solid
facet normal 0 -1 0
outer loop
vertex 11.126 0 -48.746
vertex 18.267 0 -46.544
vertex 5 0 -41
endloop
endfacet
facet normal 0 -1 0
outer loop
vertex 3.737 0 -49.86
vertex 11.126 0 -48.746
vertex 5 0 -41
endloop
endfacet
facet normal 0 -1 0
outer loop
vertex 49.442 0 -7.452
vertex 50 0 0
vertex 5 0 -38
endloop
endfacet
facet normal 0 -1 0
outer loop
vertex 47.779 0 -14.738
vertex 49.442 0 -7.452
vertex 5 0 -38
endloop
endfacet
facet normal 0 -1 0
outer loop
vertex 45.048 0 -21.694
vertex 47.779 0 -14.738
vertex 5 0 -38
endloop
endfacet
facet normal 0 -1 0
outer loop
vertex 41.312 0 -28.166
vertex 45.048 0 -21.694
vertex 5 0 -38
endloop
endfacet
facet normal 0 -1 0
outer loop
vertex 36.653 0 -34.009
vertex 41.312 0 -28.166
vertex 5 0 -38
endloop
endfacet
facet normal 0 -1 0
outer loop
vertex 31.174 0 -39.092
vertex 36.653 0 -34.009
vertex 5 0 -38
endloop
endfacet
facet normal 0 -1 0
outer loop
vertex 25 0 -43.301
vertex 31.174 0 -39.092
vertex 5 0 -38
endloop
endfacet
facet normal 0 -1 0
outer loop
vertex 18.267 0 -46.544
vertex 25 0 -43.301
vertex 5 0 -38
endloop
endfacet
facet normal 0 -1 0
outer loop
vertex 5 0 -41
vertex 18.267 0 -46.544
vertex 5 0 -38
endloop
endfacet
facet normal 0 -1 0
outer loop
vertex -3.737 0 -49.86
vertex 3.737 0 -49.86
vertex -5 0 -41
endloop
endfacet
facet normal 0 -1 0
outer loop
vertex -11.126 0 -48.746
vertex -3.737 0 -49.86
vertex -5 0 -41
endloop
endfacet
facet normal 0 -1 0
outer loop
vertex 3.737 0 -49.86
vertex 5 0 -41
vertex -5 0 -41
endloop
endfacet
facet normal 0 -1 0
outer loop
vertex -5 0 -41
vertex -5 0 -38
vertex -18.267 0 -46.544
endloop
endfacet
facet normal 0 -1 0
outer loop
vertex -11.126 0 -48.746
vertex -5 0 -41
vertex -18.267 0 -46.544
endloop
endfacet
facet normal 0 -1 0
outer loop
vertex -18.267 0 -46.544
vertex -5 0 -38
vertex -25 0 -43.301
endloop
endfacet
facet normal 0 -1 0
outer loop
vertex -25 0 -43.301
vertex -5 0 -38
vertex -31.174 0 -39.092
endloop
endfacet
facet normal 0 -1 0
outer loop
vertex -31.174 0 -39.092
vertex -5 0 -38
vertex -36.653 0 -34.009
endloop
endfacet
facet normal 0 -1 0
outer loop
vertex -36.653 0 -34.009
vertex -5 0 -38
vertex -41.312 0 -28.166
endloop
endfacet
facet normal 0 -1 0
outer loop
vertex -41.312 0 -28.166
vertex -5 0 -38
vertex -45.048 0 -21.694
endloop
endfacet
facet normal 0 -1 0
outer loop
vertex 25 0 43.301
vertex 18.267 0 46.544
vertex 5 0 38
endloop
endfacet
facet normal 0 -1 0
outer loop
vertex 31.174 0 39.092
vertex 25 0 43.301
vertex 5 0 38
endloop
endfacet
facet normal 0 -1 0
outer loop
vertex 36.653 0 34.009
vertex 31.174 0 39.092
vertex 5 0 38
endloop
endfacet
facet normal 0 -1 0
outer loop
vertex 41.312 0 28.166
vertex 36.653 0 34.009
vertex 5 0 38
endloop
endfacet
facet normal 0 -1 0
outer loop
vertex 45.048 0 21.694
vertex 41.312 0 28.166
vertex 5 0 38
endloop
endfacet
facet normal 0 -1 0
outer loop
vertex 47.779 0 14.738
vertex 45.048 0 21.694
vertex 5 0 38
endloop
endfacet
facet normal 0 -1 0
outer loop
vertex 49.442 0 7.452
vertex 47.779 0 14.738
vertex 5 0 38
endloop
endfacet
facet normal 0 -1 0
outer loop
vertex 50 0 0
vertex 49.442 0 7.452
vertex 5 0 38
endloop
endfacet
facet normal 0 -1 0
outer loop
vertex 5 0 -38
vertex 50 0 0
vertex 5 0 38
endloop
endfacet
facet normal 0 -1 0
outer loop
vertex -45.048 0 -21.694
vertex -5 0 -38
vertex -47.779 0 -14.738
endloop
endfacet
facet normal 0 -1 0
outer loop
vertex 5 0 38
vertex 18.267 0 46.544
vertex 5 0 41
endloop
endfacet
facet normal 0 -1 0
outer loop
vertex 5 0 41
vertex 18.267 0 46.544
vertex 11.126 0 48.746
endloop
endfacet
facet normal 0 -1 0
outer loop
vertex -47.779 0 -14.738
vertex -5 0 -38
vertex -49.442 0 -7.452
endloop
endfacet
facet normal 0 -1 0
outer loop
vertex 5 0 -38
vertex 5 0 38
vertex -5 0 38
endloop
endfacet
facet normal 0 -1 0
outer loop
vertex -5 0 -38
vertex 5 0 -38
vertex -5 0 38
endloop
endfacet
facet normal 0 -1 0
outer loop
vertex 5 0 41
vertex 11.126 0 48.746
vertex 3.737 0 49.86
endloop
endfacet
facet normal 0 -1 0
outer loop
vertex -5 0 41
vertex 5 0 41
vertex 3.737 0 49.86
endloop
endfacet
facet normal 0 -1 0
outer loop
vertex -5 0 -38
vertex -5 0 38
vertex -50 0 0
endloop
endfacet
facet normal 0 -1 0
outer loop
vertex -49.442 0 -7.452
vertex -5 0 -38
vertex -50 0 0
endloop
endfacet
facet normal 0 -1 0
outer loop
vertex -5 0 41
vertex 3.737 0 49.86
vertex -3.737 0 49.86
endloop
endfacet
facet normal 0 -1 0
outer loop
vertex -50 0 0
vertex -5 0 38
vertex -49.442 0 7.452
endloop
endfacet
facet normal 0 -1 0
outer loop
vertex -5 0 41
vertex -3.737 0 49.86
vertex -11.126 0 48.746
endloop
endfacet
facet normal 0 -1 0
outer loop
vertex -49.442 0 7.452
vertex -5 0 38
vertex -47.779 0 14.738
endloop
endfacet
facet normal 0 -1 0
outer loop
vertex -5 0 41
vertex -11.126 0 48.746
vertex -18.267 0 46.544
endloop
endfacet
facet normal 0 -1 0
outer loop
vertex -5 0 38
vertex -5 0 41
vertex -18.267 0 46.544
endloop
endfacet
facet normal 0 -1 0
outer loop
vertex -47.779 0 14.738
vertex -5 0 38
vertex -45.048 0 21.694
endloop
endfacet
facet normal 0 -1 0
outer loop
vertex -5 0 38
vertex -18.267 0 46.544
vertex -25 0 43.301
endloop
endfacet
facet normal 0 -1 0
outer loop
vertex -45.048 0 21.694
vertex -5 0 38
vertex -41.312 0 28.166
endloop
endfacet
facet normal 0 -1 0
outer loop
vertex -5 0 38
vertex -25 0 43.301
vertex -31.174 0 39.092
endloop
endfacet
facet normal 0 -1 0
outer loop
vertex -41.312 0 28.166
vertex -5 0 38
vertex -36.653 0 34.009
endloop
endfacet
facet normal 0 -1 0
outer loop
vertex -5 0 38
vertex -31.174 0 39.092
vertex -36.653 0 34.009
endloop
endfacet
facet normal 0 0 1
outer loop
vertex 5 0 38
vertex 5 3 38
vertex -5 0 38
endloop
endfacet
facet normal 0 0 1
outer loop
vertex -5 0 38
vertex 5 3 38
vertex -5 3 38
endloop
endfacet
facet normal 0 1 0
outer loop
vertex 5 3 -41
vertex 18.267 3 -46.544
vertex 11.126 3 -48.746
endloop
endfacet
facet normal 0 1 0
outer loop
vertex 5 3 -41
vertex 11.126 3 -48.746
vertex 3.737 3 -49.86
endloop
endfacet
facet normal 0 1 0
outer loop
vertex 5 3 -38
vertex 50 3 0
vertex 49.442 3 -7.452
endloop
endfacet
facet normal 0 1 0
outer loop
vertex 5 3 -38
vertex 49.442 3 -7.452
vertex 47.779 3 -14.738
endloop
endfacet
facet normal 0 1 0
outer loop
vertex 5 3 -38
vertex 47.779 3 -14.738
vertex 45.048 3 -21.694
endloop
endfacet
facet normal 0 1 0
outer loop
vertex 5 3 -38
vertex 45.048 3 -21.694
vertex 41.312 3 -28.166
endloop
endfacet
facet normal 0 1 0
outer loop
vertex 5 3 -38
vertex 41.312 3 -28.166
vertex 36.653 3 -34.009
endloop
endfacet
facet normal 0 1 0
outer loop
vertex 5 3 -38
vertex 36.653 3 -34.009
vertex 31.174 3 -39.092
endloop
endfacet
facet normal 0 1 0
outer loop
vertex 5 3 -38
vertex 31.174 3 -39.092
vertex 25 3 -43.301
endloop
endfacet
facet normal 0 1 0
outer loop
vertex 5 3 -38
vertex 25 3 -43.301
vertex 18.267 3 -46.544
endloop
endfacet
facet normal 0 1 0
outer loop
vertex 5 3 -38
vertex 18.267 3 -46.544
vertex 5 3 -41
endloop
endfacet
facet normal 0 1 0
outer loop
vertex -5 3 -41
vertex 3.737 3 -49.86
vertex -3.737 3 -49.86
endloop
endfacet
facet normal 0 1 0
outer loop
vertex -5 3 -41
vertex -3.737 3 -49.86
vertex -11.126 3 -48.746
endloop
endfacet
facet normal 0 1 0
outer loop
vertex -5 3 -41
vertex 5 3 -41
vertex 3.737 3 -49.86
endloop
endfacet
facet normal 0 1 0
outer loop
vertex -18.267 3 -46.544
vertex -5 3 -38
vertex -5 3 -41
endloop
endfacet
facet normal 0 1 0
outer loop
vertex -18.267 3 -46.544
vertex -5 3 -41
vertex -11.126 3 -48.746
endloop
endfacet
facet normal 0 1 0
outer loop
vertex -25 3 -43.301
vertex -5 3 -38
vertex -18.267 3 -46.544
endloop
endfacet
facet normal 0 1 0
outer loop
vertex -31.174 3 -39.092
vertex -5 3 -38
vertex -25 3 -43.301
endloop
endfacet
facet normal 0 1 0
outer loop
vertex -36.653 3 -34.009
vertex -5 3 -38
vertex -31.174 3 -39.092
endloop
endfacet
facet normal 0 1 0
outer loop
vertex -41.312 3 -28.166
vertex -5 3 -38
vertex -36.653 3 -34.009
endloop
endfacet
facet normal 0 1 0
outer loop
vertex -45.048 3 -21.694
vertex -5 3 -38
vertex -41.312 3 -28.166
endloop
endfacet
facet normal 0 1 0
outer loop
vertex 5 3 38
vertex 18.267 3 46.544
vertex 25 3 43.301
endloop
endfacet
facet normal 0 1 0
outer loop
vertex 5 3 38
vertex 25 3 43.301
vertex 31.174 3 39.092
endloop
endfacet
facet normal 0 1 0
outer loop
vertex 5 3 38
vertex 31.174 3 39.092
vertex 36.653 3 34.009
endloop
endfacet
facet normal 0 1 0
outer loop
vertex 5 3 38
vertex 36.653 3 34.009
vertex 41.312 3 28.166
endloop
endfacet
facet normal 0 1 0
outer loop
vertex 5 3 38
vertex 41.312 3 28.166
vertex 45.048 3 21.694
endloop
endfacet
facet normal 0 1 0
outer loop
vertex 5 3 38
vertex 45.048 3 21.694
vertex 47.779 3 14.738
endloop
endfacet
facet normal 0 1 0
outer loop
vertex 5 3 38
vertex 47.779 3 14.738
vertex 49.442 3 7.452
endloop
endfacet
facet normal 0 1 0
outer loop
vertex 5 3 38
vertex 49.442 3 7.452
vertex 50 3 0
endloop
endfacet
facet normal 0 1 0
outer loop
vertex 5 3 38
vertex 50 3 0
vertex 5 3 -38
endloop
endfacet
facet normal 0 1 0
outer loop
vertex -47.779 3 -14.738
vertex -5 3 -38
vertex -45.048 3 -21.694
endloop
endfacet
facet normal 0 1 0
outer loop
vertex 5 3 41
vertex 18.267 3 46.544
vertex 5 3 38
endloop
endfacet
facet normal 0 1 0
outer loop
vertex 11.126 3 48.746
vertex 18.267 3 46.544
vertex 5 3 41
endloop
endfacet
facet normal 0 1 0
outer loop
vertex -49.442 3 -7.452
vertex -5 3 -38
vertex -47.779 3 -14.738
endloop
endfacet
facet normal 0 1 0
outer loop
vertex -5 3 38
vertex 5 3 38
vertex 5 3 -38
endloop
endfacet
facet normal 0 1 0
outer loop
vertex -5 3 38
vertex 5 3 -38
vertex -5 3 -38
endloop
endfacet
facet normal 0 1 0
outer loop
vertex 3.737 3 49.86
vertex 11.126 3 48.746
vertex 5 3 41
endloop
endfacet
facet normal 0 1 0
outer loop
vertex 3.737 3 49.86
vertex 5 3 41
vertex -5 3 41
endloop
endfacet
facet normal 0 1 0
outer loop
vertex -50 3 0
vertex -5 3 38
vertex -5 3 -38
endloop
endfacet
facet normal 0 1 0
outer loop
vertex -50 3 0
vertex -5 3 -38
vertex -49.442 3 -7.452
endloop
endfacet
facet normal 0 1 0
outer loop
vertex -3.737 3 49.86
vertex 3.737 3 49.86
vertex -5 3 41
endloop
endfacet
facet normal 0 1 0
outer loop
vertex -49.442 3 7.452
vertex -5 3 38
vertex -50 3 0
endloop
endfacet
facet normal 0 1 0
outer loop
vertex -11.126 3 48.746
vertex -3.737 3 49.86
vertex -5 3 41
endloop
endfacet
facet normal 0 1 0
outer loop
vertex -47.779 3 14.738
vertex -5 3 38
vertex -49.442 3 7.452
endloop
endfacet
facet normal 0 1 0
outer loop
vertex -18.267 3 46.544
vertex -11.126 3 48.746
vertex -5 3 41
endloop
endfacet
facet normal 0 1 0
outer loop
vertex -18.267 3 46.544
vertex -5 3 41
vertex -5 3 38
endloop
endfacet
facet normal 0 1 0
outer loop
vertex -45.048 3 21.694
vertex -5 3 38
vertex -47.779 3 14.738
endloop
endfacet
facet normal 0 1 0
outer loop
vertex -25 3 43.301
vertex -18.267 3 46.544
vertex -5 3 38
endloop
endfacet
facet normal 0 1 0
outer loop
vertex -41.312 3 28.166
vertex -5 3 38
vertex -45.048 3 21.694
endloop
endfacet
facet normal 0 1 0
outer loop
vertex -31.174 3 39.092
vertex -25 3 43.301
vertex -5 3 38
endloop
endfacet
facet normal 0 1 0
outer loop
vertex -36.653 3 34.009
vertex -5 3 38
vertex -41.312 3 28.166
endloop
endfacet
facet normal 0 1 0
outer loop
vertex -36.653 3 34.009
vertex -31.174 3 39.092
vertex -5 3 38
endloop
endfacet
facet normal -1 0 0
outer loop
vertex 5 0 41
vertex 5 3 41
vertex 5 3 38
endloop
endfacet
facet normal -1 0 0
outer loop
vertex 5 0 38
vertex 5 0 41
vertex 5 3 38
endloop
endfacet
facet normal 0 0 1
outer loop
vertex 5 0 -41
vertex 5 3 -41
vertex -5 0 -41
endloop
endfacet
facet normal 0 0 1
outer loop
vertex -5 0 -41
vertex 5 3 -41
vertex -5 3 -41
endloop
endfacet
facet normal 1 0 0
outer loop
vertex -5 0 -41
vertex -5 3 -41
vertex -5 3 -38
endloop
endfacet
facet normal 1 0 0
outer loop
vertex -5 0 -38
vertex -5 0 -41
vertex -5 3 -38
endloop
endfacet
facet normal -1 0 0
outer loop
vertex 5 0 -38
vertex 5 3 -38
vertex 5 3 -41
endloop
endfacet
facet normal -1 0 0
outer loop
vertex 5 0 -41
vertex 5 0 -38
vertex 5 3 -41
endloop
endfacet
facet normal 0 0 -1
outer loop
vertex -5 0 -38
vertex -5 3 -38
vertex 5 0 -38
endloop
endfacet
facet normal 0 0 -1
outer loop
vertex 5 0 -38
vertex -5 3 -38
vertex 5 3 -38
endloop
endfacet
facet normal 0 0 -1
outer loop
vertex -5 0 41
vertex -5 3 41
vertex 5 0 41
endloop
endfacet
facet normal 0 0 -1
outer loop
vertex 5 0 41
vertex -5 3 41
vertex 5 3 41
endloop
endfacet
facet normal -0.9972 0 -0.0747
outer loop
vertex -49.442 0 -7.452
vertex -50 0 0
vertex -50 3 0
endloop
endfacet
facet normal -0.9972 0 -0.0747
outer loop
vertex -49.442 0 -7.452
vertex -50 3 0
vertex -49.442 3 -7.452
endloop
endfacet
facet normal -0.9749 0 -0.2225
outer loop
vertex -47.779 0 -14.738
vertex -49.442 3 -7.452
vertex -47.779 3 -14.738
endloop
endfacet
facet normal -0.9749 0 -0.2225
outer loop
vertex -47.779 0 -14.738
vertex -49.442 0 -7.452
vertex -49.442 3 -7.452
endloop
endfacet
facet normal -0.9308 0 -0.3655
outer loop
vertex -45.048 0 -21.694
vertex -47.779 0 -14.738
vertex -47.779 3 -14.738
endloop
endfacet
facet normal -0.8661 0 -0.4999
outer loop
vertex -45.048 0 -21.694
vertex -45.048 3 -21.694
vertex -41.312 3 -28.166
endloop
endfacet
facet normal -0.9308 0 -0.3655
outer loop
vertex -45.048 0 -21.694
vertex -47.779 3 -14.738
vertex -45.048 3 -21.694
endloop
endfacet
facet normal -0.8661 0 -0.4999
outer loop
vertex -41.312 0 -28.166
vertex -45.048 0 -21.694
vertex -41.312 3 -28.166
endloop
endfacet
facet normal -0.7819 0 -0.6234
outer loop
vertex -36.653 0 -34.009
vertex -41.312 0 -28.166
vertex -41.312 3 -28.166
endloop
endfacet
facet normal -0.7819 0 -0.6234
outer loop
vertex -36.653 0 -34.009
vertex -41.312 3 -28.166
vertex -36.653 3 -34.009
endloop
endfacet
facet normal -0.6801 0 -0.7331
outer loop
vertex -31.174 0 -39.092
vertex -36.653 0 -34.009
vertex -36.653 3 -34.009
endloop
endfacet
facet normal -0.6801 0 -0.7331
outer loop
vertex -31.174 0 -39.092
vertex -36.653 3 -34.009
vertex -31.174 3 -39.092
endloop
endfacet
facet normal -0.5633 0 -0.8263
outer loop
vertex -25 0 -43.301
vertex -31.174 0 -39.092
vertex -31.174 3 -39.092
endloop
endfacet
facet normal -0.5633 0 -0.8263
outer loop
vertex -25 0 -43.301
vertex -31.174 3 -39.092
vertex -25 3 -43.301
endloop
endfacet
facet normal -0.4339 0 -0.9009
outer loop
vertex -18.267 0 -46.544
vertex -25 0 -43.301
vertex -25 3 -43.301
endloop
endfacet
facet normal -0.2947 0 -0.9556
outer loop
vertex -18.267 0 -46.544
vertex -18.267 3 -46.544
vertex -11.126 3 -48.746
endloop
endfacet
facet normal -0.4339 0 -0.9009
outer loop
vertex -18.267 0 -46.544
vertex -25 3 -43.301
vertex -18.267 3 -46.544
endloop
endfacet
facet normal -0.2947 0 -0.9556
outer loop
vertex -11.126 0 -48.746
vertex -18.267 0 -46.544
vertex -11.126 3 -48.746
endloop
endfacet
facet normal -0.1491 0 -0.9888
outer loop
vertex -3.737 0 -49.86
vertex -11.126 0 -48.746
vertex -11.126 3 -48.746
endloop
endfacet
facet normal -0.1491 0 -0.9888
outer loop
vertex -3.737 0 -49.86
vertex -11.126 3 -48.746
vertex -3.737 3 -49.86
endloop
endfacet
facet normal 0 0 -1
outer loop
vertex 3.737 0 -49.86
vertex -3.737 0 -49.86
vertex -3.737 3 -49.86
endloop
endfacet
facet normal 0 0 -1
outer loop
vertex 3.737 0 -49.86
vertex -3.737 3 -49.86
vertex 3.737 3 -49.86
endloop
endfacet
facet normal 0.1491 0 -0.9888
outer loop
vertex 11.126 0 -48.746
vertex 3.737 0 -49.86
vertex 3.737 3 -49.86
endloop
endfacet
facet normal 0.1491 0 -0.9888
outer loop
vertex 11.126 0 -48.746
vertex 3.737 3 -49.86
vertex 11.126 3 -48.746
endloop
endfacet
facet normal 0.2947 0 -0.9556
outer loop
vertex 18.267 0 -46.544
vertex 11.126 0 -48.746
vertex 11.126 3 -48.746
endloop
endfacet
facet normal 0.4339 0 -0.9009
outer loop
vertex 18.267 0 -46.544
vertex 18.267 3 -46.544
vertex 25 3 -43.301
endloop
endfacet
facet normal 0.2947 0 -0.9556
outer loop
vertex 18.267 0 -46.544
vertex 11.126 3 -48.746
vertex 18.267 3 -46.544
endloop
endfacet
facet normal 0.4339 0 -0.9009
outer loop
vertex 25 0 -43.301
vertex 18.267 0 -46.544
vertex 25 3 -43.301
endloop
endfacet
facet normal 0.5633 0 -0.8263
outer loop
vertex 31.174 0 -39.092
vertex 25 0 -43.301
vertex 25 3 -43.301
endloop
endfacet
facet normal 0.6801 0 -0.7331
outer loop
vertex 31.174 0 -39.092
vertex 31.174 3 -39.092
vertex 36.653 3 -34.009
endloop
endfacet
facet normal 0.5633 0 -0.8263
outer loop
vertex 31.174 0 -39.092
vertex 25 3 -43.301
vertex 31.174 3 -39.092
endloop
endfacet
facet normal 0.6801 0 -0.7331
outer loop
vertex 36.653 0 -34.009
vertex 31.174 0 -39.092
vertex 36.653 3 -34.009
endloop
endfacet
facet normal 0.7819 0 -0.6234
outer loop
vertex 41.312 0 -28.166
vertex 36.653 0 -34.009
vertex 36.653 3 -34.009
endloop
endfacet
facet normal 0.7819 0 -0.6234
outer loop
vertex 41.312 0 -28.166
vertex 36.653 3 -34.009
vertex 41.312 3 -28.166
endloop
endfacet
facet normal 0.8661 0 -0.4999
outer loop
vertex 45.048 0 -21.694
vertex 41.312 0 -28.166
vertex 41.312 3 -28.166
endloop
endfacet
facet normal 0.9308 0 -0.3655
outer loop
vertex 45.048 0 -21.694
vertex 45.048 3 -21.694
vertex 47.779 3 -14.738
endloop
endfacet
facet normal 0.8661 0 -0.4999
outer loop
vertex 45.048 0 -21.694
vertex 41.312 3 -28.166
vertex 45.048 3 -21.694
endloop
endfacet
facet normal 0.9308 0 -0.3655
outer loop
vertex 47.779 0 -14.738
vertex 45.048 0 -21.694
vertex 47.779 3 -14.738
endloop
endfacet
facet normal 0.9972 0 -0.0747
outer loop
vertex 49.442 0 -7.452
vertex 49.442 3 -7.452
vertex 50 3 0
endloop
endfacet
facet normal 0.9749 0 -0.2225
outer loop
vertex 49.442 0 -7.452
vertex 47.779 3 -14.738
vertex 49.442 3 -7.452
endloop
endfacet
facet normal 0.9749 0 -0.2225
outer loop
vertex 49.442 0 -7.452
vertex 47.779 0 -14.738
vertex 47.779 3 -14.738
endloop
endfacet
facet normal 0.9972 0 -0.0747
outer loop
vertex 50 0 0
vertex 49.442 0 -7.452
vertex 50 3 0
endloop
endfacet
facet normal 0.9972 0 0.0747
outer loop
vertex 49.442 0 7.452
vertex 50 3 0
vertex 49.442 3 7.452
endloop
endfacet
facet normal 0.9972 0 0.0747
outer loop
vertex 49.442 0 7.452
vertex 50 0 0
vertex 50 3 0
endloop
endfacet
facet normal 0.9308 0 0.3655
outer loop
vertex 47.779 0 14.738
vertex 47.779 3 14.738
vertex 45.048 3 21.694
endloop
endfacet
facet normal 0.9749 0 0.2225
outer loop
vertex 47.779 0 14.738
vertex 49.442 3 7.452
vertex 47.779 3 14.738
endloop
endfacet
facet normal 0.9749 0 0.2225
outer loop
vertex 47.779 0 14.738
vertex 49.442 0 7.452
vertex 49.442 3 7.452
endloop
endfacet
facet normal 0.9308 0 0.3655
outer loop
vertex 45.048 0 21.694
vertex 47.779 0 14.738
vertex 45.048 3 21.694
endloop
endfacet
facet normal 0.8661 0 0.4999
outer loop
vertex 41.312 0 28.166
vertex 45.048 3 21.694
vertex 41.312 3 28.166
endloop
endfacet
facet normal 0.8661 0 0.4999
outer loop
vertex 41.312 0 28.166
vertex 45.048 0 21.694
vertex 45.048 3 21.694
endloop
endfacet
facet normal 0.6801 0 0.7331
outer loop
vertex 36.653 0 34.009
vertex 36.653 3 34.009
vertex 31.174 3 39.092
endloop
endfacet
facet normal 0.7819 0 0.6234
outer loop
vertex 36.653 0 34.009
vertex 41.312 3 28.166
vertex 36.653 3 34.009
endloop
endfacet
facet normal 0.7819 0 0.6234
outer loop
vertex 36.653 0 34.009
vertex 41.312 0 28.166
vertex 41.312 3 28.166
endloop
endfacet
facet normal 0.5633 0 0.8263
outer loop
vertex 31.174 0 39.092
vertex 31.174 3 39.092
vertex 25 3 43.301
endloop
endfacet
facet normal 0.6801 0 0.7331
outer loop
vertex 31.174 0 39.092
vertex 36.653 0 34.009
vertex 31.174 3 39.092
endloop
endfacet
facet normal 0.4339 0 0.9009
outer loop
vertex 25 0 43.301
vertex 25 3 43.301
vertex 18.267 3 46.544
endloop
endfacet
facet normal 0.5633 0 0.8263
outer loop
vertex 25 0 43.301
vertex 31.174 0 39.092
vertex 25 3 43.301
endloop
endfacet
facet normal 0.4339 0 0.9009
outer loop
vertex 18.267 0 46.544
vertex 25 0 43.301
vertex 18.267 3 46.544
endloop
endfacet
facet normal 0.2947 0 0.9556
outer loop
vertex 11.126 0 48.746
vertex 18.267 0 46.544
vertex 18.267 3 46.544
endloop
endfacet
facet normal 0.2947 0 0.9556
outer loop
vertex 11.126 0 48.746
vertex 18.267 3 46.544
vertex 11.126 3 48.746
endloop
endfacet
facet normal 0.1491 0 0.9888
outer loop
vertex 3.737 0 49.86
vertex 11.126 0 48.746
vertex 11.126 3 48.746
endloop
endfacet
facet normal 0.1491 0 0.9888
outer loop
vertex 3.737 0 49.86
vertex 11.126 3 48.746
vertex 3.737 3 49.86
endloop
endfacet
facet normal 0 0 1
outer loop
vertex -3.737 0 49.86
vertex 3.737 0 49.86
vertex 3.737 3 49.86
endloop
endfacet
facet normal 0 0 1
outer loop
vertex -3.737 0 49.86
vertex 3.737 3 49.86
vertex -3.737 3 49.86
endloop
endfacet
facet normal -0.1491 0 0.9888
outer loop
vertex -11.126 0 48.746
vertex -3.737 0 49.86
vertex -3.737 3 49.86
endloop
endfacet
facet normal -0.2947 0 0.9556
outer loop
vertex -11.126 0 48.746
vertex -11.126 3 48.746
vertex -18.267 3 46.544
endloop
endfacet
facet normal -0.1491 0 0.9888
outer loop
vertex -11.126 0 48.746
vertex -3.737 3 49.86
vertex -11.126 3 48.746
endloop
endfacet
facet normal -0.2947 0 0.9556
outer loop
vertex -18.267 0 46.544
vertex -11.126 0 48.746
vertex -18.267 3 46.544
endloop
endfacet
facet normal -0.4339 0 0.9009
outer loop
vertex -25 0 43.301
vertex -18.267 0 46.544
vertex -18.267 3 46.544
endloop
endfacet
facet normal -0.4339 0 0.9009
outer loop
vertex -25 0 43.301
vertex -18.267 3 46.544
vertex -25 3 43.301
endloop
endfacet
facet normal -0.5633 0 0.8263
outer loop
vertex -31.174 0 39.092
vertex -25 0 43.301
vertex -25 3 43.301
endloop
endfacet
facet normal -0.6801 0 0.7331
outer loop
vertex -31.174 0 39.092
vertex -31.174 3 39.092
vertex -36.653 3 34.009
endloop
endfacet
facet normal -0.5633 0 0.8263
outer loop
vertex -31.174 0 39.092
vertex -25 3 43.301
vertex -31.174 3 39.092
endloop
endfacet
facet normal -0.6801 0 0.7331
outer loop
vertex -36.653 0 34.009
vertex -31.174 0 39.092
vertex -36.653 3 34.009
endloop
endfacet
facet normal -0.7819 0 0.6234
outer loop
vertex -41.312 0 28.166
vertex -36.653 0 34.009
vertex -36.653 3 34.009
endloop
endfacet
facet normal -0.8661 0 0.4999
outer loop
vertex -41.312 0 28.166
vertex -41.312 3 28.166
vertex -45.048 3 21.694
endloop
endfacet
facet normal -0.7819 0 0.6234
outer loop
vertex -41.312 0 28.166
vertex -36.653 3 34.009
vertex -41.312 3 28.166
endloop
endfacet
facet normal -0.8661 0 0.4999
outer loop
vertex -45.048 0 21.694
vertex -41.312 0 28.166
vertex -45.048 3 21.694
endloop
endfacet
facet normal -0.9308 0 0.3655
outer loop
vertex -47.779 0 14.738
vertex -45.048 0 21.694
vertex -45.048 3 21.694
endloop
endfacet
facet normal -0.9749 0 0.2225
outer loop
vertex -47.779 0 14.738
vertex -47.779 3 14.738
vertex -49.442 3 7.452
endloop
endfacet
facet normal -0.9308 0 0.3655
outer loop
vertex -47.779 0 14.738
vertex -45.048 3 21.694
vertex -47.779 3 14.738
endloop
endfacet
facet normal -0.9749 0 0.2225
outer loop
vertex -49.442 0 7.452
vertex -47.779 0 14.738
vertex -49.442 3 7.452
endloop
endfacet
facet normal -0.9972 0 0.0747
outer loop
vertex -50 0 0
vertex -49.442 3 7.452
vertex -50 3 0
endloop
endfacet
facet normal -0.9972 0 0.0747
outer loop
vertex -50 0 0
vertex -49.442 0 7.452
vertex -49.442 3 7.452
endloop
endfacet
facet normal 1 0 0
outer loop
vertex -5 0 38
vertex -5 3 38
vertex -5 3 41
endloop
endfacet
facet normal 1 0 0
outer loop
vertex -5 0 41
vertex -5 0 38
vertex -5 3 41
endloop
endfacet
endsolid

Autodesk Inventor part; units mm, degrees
ref_plane "YZ Plane" through (0, 0, 0) normal (1, 0, 0) x (0, 1, 0)
ref_plane "XZ Plane" through (0, 0, 0) normal (0, 1, 0) x (-1, 0, 0)
ref_plane "XY Plane" through (0, 0, 0) normal (0, 0, 1) x (1, 0, 0)
sketch "Sketch1" plane through (0, 0, 0) normal (0, 1, 0) x (-1, 0, 0)
  circle A0 centre (0, 0) radius 50
  dimension "d0" = 100
extrude "Extrusion1" add sketch "Sketch1" along normal blind 3
sketch "Sketch2" plane through (0, 3, 0) normal (0, 1, 0) x (1, 0, 0)
  line L0 (-5, -41) -> (5, -41)
  line L1 (5, -41) -> (5, -38)
  line L2 (5, -38) -> (-5, -38)
  line L3 (-5, -38) -> (-5, -41)
  line L4 (-5, 38) -> (5, 38)
  line L5 (5, 38) -> (5, 41)
  line L6 (5, 41) -> (-5, 41)
  line L7 (-5, 41) -> (-5, 38)
  point P0 (0, 0)
  dimension "d3" = 10
  dimension "d4" = 3
  dimension "d5" = 5
  dimension "d6" = 38
  dimension "d7" = 10
  dimension "d8" = 3
  dimension "d9" = 5
  dimension "d10" = 38
extrude "Extrusion2" cut sketch "Sketch2" against normal blind 3
properties part number "face"
